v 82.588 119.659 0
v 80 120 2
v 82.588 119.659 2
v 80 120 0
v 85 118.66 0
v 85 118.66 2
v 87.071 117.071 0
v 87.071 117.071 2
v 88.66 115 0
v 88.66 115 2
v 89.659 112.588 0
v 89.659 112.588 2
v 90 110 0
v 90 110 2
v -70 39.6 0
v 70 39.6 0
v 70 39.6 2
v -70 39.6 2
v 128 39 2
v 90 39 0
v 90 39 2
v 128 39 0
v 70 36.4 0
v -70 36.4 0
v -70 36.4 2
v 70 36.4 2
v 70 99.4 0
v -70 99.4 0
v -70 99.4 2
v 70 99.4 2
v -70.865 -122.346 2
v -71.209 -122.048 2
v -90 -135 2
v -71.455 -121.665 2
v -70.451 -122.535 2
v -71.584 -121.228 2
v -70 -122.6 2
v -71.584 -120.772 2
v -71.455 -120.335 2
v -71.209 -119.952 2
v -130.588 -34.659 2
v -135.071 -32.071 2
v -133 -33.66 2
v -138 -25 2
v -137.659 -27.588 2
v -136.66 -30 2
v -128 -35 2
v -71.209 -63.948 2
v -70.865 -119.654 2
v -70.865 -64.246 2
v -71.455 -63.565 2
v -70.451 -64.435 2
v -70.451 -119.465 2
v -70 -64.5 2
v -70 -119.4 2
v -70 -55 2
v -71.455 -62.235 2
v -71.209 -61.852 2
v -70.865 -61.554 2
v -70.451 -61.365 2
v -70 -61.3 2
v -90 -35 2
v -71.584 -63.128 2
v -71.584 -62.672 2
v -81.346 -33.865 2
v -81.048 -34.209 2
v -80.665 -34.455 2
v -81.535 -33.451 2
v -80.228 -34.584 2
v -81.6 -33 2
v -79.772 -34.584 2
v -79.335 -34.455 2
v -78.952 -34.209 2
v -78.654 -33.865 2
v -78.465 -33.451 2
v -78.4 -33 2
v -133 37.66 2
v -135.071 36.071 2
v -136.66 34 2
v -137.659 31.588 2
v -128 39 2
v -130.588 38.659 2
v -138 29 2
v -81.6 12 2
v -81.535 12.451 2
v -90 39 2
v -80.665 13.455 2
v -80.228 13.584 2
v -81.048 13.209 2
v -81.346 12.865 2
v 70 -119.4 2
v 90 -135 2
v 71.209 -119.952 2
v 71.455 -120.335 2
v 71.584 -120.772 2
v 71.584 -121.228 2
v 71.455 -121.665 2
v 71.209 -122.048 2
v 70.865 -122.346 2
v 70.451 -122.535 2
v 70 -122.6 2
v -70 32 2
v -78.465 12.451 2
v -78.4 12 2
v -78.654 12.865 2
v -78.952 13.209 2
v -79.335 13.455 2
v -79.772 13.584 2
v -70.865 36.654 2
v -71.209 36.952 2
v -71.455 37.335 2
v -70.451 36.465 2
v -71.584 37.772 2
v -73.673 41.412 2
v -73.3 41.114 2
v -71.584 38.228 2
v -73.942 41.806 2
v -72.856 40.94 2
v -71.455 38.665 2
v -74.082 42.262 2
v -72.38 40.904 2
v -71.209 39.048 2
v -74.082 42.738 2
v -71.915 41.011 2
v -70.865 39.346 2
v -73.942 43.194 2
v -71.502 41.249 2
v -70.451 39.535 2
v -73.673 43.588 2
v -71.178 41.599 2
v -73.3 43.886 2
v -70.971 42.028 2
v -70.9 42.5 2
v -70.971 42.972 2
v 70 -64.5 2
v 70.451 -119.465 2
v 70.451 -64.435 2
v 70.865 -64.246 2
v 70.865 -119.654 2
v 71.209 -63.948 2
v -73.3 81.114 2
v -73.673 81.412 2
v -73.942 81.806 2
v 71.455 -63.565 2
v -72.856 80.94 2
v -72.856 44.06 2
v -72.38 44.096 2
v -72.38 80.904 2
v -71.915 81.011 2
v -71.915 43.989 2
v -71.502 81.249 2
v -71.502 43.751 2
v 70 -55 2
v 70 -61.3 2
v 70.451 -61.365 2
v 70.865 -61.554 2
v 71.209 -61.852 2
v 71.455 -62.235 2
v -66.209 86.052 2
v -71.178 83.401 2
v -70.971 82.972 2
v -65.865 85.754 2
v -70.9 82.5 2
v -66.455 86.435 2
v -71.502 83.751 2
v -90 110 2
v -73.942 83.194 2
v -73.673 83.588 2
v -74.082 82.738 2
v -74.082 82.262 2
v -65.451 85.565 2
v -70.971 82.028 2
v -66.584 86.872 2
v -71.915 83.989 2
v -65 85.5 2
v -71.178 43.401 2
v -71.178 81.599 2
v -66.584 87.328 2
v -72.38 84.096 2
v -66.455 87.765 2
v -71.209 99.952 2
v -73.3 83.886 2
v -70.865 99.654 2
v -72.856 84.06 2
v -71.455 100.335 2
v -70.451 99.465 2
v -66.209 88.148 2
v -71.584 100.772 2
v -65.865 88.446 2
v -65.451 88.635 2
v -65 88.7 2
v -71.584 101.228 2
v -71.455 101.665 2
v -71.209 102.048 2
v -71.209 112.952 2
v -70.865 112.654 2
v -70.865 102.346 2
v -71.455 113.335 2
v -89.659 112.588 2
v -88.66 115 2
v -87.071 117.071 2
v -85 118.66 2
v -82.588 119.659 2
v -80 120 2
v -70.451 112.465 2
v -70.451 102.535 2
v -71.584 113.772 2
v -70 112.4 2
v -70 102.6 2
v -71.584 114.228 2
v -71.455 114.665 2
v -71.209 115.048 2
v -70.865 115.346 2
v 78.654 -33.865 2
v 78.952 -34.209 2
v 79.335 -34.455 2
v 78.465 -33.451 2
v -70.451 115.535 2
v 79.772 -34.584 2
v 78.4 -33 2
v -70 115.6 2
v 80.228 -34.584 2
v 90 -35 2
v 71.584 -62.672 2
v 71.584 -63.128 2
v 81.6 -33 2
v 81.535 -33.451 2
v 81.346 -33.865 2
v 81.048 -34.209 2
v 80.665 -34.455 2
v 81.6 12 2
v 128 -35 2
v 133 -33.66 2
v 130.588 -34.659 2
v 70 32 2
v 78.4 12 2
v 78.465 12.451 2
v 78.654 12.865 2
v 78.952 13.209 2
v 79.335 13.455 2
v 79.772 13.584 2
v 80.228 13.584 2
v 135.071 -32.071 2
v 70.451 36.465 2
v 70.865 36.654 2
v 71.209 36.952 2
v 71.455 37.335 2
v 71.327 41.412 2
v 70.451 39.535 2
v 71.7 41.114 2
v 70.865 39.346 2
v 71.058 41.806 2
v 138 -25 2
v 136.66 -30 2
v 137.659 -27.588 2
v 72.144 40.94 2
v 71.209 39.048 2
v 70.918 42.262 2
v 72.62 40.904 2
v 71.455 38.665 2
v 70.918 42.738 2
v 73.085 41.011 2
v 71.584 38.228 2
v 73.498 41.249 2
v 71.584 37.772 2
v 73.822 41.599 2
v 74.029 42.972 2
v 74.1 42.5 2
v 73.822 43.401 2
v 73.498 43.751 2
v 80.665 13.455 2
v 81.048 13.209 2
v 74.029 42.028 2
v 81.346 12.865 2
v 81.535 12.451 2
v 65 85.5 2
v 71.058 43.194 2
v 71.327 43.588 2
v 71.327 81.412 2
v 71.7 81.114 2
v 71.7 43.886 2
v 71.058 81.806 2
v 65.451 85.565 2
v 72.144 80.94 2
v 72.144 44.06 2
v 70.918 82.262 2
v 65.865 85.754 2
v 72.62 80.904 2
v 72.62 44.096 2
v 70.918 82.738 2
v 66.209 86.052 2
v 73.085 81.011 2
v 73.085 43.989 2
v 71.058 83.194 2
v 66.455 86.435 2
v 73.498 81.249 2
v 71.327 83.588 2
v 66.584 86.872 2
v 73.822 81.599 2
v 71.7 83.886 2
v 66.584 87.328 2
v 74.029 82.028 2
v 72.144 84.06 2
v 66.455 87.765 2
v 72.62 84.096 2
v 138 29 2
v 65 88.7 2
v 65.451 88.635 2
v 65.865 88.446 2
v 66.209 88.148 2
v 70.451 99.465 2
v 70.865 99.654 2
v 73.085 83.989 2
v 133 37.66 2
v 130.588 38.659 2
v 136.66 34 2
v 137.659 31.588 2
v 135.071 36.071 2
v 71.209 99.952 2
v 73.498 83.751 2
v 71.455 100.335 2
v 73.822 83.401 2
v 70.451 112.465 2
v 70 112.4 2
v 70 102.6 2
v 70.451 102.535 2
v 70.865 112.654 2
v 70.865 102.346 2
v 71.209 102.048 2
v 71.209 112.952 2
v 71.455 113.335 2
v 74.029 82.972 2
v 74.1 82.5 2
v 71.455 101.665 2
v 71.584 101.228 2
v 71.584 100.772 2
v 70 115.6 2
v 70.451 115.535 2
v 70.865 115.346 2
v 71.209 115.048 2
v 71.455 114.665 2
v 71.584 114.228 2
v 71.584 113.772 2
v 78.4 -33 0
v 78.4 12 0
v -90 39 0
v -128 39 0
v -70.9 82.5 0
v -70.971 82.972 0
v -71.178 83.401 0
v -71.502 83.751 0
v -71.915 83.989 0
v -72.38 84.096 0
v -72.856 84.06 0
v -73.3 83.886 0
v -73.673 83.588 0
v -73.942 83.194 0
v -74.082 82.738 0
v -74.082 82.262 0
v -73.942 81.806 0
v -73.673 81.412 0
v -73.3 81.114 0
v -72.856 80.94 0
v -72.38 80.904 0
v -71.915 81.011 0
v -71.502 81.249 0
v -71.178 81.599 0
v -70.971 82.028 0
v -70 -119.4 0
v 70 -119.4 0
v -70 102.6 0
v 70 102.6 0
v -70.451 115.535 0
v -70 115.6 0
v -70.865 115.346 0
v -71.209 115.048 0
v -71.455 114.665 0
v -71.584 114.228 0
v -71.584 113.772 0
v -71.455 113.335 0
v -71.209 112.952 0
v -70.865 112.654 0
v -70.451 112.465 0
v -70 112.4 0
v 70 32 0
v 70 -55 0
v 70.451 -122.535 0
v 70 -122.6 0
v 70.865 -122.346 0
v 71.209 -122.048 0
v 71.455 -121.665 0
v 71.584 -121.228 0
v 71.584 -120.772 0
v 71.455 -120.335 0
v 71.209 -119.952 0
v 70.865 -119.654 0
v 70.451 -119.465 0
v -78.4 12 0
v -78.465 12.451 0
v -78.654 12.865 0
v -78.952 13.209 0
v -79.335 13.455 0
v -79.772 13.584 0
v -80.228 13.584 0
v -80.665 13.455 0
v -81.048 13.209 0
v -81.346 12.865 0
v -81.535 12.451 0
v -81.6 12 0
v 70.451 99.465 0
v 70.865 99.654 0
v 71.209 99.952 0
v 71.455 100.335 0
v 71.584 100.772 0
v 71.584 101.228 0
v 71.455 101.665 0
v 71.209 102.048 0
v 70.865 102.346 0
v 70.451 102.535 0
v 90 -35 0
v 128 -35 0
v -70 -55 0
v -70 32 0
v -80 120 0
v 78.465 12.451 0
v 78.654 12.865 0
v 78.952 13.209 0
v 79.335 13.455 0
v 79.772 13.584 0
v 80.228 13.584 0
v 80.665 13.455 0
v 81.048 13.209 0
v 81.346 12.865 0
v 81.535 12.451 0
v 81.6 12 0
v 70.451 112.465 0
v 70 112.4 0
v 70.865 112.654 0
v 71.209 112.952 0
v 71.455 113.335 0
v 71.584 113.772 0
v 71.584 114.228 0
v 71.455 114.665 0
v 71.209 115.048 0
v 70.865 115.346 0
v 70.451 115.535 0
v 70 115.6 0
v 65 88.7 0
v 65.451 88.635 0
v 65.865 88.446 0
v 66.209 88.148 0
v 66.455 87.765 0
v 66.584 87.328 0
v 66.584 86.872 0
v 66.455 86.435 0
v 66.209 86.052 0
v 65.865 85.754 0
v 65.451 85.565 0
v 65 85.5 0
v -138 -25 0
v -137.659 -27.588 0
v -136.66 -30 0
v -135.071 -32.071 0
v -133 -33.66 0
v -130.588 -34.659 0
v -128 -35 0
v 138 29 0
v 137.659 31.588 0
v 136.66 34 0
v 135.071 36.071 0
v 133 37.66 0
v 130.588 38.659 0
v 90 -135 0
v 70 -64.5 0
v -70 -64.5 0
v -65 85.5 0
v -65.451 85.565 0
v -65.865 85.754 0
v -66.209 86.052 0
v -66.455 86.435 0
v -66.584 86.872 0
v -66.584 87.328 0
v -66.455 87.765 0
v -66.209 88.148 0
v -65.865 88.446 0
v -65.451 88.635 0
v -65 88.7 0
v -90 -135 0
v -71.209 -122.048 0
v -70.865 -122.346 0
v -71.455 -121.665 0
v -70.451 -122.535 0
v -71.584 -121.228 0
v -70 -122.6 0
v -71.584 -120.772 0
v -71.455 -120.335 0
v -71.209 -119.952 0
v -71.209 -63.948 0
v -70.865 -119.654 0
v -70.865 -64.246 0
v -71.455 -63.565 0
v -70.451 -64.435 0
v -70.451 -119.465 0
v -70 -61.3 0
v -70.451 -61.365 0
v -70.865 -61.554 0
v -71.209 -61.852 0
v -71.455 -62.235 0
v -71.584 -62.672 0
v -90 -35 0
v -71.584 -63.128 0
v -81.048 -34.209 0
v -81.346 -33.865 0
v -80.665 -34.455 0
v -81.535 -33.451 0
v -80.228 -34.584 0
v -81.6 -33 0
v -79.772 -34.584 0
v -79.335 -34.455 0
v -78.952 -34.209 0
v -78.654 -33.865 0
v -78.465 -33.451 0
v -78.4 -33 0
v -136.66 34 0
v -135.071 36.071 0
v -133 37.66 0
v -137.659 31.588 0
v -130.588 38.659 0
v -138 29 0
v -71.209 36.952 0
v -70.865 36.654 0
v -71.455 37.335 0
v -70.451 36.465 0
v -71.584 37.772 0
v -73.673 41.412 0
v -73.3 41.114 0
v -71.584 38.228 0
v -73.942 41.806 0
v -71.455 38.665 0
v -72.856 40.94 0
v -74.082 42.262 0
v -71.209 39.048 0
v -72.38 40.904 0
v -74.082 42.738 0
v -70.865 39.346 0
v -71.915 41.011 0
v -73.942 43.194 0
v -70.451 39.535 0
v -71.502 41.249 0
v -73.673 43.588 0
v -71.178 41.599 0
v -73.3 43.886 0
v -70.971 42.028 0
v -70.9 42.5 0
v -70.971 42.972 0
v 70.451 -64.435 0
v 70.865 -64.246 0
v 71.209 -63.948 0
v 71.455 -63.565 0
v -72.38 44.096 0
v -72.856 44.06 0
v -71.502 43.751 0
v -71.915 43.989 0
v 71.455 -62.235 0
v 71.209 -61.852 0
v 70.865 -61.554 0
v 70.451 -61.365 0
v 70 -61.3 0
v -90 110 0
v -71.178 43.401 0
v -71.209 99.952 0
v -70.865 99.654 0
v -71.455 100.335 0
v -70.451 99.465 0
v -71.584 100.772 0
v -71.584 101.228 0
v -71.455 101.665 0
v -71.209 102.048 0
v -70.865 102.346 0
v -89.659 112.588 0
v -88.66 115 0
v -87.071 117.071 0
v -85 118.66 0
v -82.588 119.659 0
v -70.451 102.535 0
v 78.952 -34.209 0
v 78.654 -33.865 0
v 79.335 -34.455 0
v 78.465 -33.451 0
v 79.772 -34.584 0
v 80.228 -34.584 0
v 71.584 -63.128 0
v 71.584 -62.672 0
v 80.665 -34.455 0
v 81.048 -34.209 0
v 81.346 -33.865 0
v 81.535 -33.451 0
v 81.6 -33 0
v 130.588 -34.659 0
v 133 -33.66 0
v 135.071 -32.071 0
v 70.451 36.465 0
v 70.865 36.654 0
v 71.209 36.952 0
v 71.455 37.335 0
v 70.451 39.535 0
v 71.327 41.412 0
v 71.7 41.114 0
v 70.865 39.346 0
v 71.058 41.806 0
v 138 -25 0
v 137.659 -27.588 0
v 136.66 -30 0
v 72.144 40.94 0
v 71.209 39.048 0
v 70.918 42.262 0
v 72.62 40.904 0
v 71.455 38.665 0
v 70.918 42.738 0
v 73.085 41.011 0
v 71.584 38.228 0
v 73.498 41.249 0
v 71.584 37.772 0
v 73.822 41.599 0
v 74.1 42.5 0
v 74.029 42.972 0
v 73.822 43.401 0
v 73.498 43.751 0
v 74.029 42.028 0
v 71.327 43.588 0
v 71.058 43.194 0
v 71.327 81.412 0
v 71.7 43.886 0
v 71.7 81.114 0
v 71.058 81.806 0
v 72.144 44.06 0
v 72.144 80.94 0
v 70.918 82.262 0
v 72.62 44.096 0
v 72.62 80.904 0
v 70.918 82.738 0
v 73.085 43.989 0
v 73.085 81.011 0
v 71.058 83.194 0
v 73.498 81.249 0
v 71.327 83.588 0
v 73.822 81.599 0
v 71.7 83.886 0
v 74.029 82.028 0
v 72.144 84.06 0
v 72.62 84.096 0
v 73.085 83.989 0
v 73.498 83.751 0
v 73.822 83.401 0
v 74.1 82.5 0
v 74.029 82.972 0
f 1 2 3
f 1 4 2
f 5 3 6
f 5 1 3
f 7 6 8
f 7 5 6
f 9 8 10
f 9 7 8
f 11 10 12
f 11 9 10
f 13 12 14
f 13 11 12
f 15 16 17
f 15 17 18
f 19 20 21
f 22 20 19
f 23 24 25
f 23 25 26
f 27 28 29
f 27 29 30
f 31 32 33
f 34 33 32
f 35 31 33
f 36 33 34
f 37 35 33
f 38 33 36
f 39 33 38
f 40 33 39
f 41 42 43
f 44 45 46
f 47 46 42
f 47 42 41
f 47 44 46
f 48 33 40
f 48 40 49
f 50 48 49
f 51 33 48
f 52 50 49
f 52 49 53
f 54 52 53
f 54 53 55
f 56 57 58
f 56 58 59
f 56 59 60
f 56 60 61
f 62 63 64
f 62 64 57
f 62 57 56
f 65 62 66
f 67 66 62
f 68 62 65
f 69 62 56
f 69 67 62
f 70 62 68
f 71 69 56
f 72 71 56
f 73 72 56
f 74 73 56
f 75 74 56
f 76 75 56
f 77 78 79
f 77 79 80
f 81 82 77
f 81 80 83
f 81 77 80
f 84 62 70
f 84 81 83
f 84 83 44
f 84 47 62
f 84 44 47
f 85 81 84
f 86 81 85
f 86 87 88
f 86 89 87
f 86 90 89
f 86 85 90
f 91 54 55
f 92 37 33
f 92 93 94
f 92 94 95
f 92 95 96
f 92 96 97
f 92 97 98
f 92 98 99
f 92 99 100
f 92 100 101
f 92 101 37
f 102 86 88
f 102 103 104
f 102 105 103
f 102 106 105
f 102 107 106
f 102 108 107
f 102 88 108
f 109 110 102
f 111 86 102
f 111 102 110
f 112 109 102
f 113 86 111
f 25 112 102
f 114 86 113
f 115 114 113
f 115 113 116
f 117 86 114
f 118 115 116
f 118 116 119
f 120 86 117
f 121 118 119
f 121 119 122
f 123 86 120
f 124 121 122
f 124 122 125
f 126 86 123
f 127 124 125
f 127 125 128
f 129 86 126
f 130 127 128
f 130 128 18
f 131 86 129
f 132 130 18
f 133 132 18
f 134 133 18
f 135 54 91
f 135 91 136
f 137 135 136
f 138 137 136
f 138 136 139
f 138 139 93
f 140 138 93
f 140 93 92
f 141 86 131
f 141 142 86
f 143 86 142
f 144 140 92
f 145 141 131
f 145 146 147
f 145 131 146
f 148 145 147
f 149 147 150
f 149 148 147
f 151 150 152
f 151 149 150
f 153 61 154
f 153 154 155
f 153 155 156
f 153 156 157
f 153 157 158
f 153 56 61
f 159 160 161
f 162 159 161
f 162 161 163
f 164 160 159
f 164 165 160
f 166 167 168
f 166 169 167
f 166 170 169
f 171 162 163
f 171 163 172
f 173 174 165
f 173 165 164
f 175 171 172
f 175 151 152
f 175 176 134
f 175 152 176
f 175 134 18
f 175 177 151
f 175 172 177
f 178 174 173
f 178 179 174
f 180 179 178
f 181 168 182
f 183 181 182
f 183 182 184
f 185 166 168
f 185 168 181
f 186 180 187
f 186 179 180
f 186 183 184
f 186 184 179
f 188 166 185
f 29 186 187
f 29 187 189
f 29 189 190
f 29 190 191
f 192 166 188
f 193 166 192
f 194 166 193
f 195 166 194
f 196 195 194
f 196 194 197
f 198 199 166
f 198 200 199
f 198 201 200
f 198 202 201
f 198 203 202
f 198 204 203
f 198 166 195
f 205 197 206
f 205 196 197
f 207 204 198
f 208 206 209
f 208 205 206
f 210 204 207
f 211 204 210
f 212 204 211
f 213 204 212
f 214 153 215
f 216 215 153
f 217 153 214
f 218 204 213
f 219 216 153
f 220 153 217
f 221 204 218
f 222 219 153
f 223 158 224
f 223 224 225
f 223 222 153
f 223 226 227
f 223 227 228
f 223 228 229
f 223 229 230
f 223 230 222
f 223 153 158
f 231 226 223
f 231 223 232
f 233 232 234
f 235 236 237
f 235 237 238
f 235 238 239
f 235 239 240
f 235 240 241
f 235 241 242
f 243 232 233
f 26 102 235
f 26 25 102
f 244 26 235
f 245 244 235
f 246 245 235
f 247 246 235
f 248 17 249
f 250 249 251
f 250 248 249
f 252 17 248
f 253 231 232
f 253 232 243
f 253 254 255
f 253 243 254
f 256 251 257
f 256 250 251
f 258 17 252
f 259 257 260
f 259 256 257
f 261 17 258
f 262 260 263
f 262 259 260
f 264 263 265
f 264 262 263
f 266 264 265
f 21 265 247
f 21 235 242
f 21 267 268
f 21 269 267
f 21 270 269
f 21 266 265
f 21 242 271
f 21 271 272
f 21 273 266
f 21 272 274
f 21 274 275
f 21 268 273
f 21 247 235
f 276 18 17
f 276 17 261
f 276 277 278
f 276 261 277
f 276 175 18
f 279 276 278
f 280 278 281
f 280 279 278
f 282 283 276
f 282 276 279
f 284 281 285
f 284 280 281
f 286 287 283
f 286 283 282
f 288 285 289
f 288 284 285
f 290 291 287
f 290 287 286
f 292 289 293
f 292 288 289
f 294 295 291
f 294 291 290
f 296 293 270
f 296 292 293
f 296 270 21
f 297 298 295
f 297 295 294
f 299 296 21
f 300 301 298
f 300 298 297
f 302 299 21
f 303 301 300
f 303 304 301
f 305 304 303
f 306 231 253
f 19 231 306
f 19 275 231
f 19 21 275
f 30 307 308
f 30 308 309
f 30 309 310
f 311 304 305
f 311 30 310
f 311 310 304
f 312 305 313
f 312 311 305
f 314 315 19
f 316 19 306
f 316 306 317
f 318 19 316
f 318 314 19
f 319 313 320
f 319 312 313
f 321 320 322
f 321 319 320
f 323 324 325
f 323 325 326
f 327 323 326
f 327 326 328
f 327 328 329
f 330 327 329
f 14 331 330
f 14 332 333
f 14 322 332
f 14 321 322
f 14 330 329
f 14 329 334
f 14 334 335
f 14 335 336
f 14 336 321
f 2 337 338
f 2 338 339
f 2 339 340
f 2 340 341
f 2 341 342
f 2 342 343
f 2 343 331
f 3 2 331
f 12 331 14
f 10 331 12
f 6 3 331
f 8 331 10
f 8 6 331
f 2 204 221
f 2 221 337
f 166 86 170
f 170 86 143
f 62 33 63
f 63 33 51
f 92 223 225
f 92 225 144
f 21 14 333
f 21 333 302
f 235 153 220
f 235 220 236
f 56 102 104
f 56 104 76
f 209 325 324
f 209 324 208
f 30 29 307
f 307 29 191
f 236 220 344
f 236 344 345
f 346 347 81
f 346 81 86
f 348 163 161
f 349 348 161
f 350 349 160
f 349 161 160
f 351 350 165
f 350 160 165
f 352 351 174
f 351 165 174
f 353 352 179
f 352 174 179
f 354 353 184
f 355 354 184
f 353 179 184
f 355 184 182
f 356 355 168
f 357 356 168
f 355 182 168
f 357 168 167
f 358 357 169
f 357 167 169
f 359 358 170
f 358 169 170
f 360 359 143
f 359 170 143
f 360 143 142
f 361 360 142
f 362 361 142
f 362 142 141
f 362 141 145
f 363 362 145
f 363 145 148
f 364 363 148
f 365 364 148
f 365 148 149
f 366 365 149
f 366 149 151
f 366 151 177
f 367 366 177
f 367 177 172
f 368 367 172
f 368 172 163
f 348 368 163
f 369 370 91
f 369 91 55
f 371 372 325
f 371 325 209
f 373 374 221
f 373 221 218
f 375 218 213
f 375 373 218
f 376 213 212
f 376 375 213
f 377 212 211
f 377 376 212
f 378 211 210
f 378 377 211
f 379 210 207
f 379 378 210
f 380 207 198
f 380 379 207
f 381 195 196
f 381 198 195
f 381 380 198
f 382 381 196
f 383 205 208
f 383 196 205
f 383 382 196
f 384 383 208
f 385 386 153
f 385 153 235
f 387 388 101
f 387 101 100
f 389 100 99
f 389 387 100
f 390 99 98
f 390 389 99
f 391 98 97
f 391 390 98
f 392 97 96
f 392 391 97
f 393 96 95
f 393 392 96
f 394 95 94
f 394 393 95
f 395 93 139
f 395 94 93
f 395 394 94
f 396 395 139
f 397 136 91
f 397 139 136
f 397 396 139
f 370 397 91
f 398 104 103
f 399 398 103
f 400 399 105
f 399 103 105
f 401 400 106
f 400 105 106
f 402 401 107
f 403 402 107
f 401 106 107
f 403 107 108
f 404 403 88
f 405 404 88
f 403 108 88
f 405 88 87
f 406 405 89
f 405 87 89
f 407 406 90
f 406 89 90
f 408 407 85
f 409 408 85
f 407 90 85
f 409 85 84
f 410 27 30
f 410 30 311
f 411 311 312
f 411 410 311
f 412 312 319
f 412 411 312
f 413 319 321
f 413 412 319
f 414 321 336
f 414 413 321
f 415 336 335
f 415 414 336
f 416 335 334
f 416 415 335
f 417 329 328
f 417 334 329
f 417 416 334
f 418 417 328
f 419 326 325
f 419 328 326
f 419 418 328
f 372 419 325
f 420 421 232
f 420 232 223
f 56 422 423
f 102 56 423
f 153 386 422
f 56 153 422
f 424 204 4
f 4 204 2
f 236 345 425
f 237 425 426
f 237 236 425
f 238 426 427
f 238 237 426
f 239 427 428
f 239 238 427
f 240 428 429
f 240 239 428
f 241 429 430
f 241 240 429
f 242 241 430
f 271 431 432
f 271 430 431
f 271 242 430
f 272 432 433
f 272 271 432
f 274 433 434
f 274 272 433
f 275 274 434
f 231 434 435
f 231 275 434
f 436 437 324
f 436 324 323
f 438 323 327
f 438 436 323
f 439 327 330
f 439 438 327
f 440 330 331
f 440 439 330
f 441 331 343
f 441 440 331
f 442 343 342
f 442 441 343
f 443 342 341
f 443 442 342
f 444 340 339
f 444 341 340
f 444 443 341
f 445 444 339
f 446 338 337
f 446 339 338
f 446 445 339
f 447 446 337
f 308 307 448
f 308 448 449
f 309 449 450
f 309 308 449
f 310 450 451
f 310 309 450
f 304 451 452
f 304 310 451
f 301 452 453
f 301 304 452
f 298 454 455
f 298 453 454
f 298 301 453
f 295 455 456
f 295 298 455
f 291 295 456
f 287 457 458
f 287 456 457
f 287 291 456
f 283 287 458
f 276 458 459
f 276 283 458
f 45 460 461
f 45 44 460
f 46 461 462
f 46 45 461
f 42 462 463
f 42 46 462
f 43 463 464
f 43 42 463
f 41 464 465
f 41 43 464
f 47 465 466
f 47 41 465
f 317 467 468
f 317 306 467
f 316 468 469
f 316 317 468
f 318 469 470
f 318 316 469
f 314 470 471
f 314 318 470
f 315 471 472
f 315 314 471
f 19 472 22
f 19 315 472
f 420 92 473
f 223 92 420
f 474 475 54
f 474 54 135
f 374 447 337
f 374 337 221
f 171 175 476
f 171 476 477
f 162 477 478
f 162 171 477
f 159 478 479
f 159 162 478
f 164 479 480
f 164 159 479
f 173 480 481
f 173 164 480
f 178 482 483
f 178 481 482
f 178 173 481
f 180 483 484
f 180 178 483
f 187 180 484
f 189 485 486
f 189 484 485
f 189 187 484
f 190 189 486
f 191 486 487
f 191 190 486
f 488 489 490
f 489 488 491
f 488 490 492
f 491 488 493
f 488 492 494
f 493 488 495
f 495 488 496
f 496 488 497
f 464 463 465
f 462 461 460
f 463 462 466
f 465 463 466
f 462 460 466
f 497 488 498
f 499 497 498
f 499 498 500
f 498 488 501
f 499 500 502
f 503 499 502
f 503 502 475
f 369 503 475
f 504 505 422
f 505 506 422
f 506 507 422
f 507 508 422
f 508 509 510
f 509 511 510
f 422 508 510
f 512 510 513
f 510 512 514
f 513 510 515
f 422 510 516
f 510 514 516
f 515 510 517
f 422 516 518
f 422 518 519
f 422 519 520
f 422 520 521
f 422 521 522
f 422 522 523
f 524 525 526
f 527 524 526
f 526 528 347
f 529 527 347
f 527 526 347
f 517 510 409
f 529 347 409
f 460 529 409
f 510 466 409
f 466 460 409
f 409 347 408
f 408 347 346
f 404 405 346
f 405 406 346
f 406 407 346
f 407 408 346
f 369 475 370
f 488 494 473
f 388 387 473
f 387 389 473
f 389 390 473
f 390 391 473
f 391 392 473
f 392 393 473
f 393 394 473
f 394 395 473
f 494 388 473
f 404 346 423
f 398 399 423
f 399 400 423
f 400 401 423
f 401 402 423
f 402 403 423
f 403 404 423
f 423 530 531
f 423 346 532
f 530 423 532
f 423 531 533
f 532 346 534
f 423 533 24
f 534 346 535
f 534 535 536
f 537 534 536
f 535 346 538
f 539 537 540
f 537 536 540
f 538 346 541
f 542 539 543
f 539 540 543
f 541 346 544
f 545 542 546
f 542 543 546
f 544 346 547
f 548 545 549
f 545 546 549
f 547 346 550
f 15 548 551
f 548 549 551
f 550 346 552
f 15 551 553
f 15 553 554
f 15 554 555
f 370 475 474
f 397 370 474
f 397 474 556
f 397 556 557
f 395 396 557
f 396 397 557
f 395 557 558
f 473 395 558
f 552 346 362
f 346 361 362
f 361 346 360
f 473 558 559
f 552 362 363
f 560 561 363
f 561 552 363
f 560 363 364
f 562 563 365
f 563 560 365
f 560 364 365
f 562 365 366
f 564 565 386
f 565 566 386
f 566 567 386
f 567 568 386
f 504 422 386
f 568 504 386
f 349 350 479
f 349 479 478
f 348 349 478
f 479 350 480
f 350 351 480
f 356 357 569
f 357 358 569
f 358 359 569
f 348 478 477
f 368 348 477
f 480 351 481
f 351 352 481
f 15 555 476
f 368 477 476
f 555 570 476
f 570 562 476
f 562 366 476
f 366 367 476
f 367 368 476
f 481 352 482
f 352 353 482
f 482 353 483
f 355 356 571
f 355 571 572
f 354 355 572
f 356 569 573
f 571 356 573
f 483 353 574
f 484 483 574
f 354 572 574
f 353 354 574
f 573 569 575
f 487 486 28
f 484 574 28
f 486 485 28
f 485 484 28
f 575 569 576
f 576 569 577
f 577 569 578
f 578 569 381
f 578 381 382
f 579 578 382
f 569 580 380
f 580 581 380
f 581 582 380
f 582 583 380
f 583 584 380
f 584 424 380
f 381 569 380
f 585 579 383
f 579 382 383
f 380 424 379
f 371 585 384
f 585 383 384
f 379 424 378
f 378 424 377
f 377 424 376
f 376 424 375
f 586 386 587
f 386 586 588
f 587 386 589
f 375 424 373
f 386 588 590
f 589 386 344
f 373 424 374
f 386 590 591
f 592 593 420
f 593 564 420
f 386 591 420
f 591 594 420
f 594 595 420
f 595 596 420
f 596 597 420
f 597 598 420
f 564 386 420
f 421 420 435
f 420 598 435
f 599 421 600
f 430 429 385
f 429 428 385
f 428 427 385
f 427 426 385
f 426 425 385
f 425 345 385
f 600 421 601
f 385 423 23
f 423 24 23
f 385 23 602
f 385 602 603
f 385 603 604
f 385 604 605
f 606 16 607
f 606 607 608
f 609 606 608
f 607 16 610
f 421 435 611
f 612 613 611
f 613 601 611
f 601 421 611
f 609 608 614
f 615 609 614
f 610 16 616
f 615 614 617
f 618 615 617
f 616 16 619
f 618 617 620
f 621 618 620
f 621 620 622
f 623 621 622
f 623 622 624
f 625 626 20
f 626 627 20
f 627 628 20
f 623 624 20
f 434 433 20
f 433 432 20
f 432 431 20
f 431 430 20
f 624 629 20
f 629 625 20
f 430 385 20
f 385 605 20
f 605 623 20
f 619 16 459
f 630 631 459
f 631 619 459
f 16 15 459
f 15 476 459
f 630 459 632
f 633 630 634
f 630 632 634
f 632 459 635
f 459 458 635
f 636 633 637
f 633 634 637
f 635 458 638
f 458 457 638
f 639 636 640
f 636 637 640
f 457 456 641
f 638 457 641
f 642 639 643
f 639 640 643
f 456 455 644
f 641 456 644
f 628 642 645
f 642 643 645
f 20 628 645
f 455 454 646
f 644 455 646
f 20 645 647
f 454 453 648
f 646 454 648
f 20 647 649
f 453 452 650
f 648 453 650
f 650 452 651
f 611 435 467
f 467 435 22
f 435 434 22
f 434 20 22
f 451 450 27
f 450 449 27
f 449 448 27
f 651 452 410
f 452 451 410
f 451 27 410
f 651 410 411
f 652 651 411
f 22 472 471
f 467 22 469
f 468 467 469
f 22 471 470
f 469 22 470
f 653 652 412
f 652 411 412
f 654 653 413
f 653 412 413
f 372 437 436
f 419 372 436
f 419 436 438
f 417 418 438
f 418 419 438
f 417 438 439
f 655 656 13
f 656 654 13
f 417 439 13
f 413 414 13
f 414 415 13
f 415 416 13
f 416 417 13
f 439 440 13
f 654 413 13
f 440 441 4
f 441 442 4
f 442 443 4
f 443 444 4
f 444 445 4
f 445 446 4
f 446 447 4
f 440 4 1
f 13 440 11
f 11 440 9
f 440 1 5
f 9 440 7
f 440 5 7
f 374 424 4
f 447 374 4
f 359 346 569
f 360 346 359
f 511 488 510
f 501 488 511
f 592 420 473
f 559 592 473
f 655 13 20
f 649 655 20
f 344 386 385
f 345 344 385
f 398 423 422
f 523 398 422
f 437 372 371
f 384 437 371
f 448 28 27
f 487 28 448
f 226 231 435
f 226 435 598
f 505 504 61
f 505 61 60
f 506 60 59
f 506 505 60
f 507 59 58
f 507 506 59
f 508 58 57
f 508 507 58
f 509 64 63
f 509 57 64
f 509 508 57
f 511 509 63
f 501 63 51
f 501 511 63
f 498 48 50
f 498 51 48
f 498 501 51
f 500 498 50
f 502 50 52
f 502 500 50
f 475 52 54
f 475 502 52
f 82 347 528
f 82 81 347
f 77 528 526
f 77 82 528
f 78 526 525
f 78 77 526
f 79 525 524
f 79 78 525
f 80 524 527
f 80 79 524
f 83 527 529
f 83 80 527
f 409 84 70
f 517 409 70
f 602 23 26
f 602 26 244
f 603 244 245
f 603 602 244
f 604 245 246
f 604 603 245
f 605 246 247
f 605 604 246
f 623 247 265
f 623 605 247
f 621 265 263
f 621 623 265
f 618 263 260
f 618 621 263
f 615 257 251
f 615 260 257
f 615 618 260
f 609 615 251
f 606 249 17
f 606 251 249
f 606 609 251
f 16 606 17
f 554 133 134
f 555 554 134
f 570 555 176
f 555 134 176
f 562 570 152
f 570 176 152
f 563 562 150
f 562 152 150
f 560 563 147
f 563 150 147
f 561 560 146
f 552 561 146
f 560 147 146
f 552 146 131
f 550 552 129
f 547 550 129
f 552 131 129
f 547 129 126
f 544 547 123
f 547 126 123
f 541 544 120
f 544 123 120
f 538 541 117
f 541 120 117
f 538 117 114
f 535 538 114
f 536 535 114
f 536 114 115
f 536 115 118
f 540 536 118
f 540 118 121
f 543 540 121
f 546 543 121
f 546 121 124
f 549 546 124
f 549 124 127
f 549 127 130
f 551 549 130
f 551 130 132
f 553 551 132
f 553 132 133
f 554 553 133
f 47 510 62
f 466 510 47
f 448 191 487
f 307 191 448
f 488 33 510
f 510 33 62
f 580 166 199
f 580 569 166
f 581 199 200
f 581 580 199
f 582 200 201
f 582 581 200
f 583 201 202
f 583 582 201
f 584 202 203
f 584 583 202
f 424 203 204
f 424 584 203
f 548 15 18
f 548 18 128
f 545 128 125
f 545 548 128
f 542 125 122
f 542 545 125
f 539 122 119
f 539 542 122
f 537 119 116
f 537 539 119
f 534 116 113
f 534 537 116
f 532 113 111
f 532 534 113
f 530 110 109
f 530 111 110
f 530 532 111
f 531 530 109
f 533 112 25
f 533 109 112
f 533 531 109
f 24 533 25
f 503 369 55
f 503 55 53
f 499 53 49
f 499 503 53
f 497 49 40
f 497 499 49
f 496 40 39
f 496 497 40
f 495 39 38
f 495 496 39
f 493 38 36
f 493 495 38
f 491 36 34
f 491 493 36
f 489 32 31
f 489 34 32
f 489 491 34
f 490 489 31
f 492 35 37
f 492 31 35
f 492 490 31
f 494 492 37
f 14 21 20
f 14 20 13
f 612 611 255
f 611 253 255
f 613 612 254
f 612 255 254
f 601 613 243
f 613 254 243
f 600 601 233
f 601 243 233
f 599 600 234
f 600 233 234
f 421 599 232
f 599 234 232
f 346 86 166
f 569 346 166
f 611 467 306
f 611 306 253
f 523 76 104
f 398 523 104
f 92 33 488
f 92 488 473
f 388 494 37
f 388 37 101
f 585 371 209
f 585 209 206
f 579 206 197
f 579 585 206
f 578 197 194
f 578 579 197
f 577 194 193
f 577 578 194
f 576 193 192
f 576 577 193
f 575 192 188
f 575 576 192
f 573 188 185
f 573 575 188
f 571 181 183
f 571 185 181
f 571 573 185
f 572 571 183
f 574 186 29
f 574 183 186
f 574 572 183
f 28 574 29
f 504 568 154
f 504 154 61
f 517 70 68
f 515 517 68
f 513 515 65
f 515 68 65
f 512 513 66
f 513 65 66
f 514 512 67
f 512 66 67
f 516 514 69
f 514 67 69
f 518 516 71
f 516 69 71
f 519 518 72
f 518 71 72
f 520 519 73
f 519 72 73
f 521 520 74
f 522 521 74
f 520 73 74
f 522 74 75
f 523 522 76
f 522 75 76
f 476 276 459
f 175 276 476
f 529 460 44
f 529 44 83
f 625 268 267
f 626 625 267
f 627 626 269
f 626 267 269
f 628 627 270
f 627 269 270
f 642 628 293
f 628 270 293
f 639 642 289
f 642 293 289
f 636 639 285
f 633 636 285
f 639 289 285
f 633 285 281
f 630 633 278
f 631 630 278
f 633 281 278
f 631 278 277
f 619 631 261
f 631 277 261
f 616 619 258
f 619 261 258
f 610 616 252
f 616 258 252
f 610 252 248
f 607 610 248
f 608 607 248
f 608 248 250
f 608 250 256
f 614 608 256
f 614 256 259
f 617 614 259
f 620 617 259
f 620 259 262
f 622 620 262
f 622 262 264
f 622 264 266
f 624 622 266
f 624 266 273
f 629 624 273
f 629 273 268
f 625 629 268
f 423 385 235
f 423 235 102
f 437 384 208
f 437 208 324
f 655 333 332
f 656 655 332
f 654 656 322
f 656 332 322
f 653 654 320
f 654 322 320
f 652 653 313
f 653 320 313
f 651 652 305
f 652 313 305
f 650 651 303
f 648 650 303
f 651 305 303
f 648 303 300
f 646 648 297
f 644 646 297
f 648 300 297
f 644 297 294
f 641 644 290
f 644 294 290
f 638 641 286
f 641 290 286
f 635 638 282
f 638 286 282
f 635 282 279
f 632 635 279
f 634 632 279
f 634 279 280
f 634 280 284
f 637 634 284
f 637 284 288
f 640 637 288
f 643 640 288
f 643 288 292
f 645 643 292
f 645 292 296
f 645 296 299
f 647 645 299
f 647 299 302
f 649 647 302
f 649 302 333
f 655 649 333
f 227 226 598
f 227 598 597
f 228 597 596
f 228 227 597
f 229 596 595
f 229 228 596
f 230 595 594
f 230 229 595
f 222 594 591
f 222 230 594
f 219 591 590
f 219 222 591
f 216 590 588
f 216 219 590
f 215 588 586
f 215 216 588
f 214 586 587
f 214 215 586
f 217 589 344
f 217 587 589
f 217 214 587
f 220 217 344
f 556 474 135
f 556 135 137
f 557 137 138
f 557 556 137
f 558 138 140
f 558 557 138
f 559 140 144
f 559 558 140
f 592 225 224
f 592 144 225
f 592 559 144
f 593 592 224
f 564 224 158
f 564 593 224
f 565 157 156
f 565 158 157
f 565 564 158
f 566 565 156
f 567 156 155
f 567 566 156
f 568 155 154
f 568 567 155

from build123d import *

# Parameters (mm, degrees)
EXTRUDE_1_DEPTH     = 2
SKETCH_3_W          = 180
SKETCH_3_H          = 35
EXTRUDE_2_DEPTH     = 2
SKETCH_4_W          = 180
SKETCH_4_H          = 20
EXTRUDE_3_DEPTH     = 2
SKETCH_5_W          = 140
SKETCH_5_H          = 87
CUT_EXTRUDE_1_DEPTH = 194.062166154
FILLET_1_R          = 10
FILLET_2_R          = 10
FILLET_3_R          = 10
FILLET_4_R          = 10
CUT_EXTRUDE_2_DEPTH = 10
FILLET_5_R          = 10
FILLET_6_R          = 10
CUT_EXTRUDE_5_DEPTH = 10
CUT_EXTRUDE_6_DEPTH = 194.062166154
CUT_EXTRUDE_7_DEPTH = 194.062166154
SKETCH_13_R         = 1.6
CUT_EXTRUDE_8_DEPTH = 10


with BuildPart() as part:
    # 草图2 → 凸台-拉伸1 (new body)
    with BuildSketch(Plane.XY):
        Polygon((90, 100), (90, 39), (138, 39), (138, -35), (90, -35), (90, -100), (-90, -100), (-90, -35), (-138, -35), (-138, 39), (-90, 39), (-90, 100), align=None)
    extrude(amount=EXTRUDE_1_DEPTH)

    # 草图3 → 凸台-拉伸2 (add)
    with BuildSketch(Plane.XY.offset(2)):
        with Locations((0, -117.5)):
            Rectangle(SKETCH_3_W, SKETCH_3_H)
    extrude(amount=-EXTRUDE_2_DEPTH)

    # 草图4 → 凸台-拉伸3 (add)
    with BuildSketch(Plane.XY.offset(2)):
        with Locations((0, 110)):
            Rectangle(SKETCH_4_W, SKETCH_4_H)
    extrude(amount=-EXTRUDE_3_DEPTH)

    # 草图5 → 切除-拉伸1 (cut, through all)
    with BuildSketch(Plane(origin=(0, 0, 0), x_dir=(-1, 0, 0), z_dir=(0, 0, -1))):
        with Locations((0, -11.5)):
            Rectangle(SKETCH_5_W, SKETCH_5_H)
    extrude(amount=-CUT_EXTRUDE_1_DEPTH, mode=Mode.SUBTRACT)

    # 圆角1
    fillet_1_edges = [part.edges().sort_by_distance(p)[0] for p in [
        (138, -35, 1),
    ]]
    fillet(fillet_1_edges, radius=FILLET_1_R)

    # 圆角2
    fillet_2_edges = [part.edges().sort_by_distance(p)[0] for p in [
        (138, 39, 1),
    ]]
    fillet(fillet_2_edges, radius=FILLET_2_R)

    # 圆角3
    fillet_3_edges = [part.edges().sort_by_distance(p)[0] for p in [
        (-138, 39, 1),
    ]]
    fillet(fillet_3_edges, radius=FILLET_3_R)

    # 圆角4
    fillet_4_edges = [part.edges().sort_by_distance(p)[0] for p in [
        (-138, -35, 1),
    ]]
    fillet(fillet_4_edges, radius=FILLET_4_R)

    # 草图7 → 切除-拉伸2 (cut)
    with BuildSketch(Plane(origin=(0, 0, 0), x_dir=(-1, 0, 0), z_dir=(0, 0, -1))):
        with BuildLine():
            Line((-70, 115.6), (70, 115.6))
            ThreePointArc((70, 115.6), (71.6, 114), (70, 112.4))
            Line((70, 112.4), (-70, 112.4))
            ThreePointArc((-70, 112.4), (-71.6, 114), (-70, 115.6))
        make_face()
        with BuildLine():
            Line((-70, 102.6), (70, 102.6))
            ThreePointArc((70, 102.6), (71.6, 101), (70, 99.4))
            Line((70, 99.4), (-70, 99.4))
            ThreePointArc((-70, 99.4), (-71.6, 101), (-70, 102.6))
        make_face()
        with BuildLine():
            Line((-70, 39.6), (70, 39.6))
            ThreePointArc((70, 39.6), (71.6, 38), (70, 36.4))
            Line((70, 36.4), (-70, 36.4))
            ThreePointArc((-70, 36.4), (-71.6, 38), (-70, 39.6))
        make_face()
    extrude(amount=-CUT_EXTRUDE_2_DEPTH, mode=Mode.SUBTRACT)

    # 圆角5
    fillet_5_edges = [part.edges().sort_by_distance(p)[0] for p in [
        (-90, 120, 1),
    ]]
    fillet(fillet_5_edges, radius=FILLET_5_R)

    # 圆角6
    fillet_6_edges = [part.edges().sort_by_distance(p)[0] for p in [
        (90, 120, 1),
    ]]
    fillet(fillet_6_edges, radius=FILLET_6_R)

    # 草图10 → 切除-拉伸5 (cut)
    with BuildSketch(Plane(origin=(0, 0, 0), x_dir=(-1, 0, 0), z_dir=(0, 0, -1))):
        with BuildLine():
            Line((-70, -61.3), (70, -61.3))
            ThreePointArc((70, -61.3), (71.6, -62.9), (70, -64.5))
            Line((70, -64.5), (-70, -64.5))
            ThreePointArc((-70, -64.5), (-71.6, -62.9), (-70, -61.3))
        make_face()
        with BuildLine():
            Line((-70, -119.4), (70, -119.4))
            ThreePointArc((70, -119.4), (71.6, -121), (70, -122.6))
            Line((70, -122.6), (-70, -122.6))
            ThreePointArc((-70, -122.6), (-71.6, -121), (-70, -119.4))
        make_face()
    extrude(amount=-CUT_EXTRUDE_5_DEPTH, mode=Mode.SUBTRACT)

    # 草图11 → 切除-拉伸6 (cut, through all)
    with BuildSketch(Plane.XY.offset(2)):
        with BuildLine():
            Line((-65, 88.7), (65, 88.7))
            ThreePointArc((65, 88.7), (66.6, 87.1), (65, 85.5))
            Line((65, 85.5), (-65, 85.5))
            ThreePointArc((-65, 85.5), (-66.6, 87.1), (-65, 88.7))
        make_face()
    extrude(amount=-CUT_EXTRUDE_6_DEPTH, mode=Mode.SUBTRACT)

    # 草图12 → 切除-拉伸7 (cut, through all)
    with BuildSketch(Plane.XY.offset(2)):
        with BuildLine():
            Line((81.6, 12), (81.6, -33))
            ThreePointArc((81.6, -33), (80, -34.6), (78.4, -33))
            Line((78.4, -33), (78.4, 12))
            ThreePointArc((78.4, 12), (80, 13.6), (81.6, 12))
        make_face()
        with BuildLine():
            Line((-81.6, 12), (-81.6, -33))
            ThreePointArc((-81.6, -33), (-80, -34.6), (-78.4, -33))
            Line((-78.4, -33), (-78.4, 12))
            ThreePointArc((-78.4, 12), (-80, 13.6), (-81.6, 12))
        make_face()
    extrude(amount=-CUT_EXTRUDE_7_DEPTH, mode=Mode.SUBTRACT)

    # 草图13 → 切除-拉伸8 (cut)
    with BuildSketch(Plane.XY.offset(2)):
        with Locations((-72.5, 82.5)):
            Circle(SKETCH_13_R)
        with Locations((-72.5, 42.5)):
            Circle(SKETCH_13_R)
        with Locations((72.5, 82.5)):
            Circle(SKETCH_13_R)
        with Locations((72.5, 42.5)):
            Circle(SKETCH_13_R)
    extrude(amount=-CUT_EXTRUDE_8_DEPTH, mode=Mode.SUBTRACT)


solid = part.part
